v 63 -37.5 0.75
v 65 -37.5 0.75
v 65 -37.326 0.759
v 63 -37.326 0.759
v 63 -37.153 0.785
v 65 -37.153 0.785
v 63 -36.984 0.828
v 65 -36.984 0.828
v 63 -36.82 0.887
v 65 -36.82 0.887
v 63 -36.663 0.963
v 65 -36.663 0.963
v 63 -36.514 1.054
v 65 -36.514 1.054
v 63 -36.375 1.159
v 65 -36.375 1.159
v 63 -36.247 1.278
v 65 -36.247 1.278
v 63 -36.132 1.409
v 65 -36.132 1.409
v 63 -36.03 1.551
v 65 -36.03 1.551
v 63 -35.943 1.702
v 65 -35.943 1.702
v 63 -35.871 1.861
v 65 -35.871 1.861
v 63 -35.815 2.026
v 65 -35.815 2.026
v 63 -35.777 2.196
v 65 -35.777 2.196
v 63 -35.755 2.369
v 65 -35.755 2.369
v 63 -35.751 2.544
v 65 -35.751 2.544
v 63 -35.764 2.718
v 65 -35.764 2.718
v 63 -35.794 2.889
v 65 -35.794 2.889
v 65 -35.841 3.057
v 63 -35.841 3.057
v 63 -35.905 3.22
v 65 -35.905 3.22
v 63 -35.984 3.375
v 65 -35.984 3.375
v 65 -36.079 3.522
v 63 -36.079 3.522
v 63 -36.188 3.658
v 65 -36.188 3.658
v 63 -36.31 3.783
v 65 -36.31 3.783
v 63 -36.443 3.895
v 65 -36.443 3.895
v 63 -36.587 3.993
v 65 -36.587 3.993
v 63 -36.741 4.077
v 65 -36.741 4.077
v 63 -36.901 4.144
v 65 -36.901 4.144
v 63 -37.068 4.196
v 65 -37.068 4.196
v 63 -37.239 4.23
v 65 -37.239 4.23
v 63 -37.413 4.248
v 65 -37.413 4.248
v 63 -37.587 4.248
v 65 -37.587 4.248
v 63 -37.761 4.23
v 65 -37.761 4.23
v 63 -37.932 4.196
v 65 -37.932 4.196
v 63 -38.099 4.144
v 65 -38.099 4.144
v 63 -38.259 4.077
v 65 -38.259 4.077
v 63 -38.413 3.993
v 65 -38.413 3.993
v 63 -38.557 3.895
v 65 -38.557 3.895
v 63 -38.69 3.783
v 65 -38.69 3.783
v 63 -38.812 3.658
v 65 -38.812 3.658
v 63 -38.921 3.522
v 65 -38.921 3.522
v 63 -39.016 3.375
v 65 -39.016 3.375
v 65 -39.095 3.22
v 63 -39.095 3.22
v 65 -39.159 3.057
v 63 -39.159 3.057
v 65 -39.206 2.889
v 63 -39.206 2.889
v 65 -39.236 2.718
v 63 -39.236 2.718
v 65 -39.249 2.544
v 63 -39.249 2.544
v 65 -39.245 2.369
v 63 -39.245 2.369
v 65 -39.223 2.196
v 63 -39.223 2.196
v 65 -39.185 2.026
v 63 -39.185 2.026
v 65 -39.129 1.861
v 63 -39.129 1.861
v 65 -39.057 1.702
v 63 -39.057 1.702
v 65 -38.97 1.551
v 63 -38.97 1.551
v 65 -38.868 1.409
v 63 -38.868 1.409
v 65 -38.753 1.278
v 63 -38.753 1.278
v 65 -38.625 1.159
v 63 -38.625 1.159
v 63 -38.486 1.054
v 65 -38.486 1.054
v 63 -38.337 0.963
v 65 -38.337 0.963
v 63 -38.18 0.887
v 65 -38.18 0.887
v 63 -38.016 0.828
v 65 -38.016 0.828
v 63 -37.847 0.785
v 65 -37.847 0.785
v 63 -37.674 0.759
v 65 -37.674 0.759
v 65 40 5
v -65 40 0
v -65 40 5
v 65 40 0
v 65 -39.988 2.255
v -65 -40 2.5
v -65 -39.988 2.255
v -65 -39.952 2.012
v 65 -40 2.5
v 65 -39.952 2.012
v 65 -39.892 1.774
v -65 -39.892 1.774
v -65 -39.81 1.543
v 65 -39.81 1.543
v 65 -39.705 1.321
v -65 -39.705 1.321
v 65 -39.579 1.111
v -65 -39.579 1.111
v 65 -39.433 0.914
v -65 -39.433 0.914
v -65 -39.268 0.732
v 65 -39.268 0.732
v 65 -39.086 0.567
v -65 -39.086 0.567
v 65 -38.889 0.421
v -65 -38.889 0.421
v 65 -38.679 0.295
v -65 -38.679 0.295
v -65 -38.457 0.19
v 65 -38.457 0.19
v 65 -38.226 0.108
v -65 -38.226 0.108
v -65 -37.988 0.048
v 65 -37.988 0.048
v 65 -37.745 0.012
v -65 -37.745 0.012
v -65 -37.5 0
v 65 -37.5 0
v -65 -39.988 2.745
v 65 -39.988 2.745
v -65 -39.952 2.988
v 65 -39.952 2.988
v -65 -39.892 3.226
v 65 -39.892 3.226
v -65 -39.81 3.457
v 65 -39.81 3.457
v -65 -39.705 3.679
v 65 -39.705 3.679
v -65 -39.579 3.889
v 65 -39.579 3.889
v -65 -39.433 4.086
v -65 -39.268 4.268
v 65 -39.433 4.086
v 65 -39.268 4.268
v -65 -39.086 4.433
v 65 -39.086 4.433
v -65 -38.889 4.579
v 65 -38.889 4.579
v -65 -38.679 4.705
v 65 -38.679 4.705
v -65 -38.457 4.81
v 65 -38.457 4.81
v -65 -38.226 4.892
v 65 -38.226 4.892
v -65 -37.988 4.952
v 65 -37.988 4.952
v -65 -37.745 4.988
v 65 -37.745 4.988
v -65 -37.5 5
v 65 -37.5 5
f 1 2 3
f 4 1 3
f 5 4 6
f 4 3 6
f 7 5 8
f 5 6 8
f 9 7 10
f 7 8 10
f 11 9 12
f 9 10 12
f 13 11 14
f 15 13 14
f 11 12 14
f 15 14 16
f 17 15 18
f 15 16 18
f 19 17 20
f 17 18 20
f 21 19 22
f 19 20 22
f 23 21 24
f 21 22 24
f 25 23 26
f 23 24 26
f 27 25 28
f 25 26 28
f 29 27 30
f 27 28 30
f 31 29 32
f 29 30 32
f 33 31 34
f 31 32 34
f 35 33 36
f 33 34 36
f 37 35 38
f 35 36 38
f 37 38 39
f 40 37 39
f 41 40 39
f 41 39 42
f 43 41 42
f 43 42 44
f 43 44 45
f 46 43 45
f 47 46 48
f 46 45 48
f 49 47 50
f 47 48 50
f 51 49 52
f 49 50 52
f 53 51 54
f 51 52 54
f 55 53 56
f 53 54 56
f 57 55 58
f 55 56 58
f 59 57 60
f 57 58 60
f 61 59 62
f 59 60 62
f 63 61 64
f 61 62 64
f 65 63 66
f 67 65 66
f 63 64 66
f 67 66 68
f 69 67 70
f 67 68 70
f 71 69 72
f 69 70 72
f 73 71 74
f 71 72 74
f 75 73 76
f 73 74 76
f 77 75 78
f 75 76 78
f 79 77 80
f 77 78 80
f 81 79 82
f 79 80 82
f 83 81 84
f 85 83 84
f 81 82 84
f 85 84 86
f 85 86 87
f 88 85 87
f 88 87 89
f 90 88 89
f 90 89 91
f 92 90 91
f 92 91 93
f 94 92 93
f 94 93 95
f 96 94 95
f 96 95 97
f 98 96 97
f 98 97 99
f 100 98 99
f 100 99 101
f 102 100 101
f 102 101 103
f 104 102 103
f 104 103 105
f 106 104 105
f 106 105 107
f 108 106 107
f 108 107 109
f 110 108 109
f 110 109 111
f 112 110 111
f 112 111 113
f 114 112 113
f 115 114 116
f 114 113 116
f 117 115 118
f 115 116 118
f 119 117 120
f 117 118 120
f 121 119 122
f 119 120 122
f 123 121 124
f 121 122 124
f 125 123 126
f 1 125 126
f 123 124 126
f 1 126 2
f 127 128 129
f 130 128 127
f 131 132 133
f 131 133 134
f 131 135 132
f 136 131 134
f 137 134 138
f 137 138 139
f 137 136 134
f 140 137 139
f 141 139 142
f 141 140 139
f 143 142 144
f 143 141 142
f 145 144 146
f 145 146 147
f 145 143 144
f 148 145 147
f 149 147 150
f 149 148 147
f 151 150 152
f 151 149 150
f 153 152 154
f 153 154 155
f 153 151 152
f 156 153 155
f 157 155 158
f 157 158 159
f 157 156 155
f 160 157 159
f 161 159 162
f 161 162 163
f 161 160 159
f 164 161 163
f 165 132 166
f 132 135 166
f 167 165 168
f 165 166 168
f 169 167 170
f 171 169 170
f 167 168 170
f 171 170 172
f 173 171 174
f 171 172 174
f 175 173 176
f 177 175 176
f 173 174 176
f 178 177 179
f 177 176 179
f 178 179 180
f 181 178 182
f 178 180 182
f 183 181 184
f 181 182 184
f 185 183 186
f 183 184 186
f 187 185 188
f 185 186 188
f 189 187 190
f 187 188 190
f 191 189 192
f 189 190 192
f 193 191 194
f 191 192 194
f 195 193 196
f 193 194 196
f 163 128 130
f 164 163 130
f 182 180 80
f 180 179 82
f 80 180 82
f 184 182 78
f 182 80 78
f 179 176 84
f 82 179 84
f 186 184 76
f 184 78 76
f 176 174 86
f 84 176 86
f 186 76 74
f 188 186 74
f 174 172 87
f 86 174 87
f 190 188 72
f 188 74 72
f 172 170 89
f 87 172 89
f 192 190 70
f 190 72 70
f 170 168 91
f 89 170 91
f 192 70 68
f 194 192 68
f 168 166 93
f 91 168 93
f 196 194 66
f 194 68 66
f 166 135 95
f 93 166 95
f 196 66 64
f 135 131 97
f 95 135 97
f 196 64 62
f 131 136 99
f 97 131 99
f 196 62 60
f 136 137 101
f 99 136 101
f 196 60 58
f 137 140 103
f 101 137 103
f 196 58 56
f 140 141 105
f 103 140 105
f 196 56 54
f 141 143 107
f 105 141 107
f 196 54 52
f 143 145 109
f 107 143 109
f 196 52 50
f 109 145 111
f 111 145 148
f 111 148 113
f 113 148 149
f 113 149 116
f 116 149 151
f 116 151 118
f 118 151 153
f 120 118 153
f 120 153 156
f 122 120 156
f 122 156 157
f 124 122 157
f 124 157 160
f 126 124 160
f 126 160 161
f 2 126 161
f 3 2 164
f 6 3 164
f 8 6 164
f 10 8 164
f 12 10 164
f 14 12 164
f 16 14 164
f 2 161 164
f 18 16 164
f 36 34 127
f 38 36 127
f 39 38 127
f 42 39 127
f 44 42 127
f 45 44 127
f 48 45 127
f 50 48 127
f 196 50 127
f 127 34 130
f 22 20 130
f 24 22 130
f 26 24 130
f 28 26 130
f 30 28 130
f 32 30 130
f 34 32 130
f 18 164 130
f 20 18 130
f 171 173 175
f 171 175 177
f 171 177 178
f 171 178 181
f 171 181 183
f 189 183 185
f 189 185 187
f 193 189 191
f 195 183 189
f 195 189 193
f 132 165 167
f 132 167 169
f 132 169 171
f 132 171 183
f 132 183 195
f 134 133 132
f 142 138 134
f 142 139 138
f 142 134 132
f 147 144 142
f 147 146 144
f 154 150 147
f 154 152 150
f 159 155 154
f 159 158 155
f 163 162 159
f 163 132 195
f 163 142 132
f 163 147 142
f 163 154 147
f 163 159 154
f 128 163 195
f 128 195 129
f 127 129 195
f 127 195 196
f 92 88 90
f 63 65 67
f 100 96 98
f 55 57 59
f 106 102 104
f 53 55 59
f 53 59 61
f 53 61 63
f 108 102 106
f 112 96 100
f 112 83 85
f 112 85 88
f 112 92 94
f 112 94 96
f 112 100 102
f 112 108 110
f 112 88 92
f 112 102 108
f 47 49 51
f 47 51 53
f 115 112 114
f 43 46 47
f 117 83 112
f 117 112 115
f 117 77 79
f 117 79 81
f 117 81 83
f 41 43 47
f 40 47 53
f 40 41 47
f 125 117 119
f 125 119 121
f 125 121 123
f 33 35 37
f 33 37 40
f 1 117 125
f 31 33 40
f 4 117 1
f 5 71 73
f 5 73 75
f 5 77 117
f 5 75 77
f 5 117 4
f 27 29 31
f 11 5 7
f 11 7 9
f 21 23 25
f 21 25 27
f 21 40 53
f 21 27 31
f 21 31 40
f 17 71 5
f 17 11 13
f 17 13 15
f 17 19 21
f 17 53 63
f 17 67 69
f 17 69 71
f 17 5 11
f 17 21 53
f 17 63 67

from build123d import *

# Parameters (mm, degrees)
SKETCH1_W           = 130
SKETCH1_H           = 80
BOSS_EXTRUDE1_DEPTH = 5
FILLET1_R           = 2.5
SKETCH2_R           = 1.75
CUT_EXTRUDE1_DEPTH  = 2


with BuildPart() as part:
    # Sketch1 → Boss-Extrude1 (new body)
    with BuildSketch(Plane.XY):
        Rectangle(SKETCH1_W, SKETCH1_H)
    extrude(amount=BOSS_EXTRUDE1_DEPTH)

    # Fillet1
    fillet1_edges = [part.edges().sort_by_distance(p)[0] for p in [
        (0, -40, 0),
        (0, -40, 5),
    ]]
    fillet(fillet1_edges, radius=FILLET1_R - 0.0001)  # a hair under: the kernel refuses the full size

    # Sketch2 → Cut-Extrude1 (cut)
    with BuildSketch(Plane(origin=(65, 0, 0), x_dir=(0, 0, -1), z_dir=(1, 0, 0))):
        with Locations((-2.5, -37.5)):
            Circle(SKETCH2_R)
    extrude(amount=-CUT_EXTRUDE1_DEPTH, mode=Mode.SUBTRACT)


solid = part.part
